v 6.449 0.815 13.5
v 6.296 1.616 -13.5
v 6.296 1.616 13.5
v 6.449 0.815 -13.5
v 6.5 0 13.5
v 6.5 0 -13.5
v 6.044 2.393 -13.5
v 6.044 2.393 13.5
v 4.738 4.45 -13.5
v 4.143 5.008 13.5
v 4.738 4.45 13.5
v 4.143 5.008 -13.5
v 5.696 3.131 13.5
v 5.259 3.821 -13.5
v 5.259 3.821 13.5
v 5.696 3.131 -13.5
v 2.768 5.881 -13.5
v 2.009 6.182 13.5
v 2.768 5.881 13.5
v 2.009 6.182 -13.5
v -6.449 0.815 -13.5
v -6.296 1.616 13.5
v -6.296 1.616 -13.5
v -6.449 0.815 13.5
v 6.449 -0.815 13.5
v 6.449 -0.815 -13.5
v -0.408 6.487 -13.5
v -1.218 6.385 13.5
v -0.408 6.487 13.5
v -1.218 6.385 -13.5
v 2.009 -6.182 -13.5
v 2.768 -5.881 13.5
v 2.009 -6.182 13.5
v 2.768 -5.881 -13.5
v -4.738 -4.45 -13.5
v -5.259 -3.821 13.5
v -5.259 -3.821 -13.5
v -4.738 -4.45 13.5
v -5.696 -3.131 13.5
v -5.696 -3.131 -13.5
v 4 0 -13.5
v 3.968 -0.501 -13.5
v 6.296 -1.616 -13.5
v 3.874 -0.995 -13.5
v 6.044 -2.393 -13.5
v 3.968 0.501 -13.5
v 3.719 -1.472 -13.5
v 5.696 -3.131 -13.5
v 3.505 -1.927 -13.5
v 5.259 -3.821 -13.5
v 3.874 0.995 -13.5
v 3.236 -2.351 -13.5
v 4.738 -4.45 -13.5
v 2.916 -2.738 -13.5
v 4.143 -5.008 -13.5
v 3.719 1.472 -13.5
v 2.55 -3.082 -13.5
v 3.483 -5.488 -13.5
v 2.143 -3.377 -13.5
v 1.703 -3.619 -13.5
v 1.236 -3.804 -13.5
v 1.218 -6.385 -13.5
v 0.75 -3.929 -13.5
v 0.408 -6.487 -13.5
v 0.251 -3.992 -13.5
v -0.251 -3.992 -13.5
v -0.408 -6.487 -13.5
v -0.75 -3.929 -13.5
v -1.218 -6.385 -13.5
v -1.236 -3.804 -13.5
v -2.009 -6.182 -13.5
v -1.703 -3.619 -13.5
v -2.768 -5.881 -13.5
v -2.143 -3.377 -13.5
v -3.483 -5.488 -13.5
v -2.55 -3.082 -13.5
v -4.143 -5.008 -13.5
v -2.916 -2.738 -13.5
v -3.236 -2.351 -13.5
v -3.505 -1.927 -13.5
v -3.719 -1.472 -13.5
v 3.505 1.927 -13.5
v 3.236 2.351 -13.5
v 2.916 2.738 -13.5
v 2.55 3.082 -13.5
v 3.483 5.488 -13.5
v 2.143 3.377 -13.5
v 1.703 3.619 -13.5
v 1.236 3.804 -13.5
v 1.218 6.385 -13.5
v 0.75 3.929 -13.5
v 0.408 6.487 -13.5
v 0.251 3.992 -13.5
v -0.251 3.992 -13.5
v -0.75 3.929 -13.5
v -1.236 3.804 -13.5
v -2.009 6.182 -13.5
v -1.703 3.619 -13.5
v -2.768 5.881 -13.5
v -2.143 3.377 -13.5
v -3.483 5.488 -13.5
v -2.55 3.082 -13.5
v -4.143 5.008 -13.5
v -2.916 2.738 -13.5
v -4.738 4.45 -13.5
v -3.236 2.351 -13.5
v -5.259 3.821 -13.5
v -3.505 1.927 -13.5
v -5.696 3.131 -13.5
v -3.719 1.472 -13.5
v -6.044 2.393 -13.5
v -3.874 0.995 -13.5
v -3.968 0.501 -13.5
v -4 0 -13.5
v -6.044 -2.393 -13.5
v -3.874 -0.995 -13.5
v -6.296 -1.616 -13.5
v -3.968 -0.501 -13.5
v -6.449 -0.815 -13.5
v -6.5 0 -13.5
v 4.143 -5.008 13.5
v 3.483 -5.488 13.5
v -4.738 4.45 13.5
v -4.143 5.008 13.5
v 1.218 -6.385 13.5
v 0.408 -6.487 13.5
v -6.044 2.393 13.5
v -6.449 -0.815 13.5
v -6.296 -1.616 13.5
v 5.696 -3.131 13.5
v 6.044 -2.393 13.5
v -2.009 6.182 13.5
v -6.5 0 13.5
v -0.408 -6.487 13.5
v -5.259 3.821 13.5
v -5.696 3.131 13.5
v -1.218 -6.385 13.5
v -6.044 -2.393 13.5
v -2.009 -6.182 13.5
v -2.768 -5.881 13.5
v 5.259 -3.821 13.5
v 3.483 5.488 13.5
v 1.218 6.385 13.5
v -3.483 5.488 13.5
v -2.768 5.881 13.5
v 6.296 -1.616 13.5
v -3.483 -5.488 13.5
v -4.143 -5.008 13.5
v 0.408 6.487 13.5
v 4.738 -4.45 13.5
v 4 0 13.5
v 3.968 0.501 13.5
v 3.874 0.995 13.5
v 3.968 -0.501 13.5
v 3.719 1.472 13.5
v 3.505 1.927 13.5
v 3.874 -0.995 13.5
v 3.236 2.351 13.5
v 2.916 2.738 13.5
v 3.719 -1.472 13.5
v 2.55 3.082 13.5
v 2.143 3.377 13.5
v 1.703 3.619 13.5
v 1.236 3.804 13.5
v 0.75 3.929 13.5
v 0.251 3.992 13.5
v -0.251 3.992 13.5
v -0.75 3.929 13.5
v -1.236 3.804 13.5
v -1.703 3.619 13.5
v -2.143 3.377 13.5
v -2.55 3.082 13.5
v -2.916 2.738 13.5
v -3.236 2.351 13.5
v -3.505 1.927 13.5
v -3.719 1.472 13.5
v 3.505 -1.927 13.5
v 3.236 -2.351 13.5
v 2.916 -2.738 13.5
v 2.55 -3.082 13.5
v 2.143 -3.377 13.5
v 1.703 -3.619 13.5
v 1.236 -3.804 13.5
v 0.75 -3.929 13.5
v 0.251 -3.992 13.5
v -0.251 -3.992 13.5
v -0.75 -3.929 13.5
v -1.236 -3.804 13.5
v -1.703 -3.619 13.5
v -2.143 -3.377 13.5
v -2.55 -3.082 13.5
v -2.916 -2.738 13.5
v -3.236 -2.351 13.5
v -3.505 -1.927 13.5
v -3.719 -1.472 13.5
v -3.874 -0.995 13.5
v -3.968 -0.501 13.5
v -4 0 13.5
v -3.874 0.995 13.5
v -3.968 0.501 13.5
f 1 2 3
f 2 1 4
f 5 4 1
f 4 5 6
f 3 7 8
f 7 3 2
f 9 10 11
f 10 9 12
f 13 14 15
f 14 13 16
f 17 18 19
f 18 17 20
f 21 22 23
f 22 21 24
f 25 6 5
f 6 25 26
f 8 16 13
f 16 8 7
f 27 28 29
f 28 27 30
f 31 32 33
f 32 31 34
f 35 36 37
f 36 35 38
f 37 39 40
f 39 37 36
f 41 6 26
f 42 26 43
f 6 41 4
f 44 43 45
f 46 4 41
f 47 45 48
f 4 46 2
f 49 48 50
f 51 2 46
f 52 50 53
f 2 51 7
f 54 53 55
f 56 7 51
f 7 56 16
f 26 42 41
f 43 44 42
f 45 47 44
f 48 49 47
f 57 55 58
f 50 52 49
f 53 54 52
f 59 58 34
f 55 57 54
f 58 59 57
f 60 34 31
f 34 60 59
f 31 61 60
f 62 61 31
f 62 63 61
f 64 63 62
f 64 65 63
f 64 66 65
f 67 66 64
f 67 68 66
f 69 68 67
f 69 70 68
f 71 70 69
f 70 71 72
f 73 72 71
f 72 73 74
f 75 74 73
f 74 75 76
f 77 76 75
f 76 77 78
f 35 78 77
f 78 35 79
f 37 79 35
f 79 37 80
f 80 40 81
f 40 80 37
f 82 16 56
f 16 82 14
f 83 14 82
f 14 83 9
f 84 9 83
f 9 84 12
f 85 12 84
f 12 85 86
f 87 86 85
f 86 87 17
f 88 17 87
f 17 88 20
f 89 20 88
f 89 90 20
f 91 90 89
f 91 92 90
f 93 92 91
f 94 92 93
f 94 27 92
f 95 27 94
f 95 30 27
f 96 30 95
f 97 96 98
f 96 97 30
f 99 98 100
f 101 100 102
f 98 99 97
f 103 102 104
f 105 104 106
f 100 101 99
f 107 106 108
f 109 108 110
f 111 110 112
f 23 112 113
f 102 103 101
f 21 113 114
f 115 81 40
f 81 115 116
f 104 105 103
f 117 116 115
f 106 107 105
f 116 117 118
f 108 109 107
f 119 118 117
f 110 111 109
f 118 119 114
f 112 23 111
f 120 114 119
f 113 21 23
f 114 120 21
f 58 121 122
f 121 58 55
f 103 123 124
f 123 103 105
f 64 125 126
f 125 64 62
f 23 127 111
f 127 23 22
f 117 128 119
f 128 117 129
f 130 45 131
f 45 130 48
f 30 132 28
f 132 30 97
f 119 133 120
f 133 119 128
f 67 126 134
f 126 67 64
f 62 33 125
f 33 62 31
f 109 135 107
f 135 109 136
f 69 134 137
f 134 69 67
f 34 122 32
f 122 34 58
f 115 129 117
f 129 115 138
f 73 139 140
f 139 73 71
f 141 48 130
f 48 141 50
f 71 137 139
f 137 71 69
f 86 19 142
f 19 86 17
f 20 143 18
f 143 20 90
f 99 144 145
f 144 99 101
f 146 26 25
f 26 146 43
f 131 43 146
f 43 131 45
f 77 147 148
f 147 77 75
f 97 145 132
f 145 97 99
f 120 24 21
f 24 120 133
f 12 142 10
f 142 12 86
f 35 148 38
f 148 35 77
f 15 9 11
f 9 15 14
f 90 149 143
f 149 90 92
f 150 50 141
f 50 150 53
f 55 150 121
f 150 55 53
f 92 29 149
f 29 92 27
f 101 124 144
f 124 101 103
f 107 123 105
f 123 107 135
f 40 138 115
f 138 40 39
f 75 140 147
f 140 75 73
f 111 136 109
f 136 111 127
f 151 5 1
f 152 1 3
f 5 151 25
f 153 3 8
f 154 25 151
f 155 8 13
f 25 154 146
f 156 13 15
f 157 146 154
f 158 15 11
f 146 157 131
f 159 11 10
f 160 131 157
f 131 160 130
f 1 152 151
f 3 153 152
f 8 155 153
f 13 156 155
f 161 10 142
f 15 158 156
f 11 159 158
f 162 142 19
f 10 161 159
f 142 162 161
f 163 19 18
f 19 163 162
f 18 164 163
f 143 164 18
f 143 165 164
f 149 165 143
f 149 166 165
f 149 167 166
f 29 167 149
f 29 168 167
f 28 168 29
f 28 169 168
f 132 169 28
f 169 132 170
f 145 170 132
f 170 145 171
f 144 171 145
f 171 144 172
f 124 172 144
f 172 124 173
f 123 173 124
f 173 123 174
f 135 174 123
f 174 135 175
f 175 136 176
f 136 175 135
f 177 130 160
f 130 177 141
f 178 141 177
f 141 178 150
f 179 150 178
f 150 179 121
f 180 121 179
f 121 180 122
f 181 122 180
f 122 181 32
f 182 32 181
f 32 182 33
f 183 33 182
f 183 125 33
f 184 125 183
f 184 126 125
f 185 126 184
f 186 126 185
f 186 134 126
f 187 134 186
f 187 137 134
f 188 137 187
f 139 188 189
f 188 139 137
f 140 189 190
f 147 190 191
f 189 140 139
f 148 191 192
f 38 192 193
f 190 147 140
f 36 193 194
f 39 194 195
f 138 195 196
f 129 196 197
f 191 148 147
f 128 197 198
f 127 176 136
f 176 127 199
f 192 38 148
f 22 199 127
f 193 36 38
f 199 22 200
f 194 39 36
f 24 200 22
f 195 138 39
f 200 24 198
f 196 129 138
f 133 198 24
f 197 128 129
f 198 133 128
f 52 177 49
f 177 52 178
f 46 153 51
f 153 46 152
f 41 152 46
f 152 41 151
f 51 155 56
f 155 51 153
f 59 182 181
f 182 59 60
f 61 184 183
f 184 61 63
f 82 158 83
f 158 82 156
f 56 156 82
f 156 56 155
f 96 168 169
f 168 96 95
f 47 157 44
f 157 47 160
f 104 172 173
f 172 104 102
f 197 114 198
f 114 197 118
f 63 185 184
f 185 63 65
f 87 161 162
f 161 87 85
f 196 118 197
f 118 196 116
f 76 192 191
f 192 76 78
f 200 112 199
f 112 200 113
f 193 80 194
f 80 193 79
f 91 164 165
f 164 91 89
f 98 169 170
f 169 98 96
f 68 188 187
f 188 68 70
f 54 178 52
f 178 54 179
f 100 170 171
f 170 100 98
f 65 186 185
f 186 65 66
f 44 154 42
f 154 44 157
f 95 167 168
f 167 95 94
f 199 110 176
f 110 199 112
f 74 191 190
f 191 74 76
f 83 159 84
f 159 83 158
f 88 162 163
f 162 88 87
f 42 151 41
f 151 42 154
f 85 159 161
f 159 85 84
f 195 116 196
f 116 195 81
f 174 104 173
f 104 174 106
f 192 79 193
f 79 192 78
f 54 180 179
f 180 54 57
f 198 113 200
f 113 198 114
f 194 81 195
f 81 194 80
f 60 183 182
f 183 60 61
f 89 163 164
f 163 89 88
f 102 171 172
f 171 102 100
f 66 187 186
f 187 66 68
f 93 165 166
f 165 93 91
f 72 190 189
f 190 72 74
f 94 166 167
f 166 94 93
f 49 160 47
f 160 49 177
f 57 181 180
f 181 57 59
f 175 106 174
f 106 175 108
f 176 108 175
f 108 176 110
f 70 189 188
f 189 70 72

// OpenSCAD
$fn = 50;


difference() {
	union() {
		translate(v = [0, 0, -13.5000000000]) {
			cylinder(h = 27, r = 6.5000000000);
		}
	}
	union() {
		translate(v = [0, 0, -100.0000000000]) {
			cylinder(h = 200, r = 4.0000000000);
		}
	}
}
